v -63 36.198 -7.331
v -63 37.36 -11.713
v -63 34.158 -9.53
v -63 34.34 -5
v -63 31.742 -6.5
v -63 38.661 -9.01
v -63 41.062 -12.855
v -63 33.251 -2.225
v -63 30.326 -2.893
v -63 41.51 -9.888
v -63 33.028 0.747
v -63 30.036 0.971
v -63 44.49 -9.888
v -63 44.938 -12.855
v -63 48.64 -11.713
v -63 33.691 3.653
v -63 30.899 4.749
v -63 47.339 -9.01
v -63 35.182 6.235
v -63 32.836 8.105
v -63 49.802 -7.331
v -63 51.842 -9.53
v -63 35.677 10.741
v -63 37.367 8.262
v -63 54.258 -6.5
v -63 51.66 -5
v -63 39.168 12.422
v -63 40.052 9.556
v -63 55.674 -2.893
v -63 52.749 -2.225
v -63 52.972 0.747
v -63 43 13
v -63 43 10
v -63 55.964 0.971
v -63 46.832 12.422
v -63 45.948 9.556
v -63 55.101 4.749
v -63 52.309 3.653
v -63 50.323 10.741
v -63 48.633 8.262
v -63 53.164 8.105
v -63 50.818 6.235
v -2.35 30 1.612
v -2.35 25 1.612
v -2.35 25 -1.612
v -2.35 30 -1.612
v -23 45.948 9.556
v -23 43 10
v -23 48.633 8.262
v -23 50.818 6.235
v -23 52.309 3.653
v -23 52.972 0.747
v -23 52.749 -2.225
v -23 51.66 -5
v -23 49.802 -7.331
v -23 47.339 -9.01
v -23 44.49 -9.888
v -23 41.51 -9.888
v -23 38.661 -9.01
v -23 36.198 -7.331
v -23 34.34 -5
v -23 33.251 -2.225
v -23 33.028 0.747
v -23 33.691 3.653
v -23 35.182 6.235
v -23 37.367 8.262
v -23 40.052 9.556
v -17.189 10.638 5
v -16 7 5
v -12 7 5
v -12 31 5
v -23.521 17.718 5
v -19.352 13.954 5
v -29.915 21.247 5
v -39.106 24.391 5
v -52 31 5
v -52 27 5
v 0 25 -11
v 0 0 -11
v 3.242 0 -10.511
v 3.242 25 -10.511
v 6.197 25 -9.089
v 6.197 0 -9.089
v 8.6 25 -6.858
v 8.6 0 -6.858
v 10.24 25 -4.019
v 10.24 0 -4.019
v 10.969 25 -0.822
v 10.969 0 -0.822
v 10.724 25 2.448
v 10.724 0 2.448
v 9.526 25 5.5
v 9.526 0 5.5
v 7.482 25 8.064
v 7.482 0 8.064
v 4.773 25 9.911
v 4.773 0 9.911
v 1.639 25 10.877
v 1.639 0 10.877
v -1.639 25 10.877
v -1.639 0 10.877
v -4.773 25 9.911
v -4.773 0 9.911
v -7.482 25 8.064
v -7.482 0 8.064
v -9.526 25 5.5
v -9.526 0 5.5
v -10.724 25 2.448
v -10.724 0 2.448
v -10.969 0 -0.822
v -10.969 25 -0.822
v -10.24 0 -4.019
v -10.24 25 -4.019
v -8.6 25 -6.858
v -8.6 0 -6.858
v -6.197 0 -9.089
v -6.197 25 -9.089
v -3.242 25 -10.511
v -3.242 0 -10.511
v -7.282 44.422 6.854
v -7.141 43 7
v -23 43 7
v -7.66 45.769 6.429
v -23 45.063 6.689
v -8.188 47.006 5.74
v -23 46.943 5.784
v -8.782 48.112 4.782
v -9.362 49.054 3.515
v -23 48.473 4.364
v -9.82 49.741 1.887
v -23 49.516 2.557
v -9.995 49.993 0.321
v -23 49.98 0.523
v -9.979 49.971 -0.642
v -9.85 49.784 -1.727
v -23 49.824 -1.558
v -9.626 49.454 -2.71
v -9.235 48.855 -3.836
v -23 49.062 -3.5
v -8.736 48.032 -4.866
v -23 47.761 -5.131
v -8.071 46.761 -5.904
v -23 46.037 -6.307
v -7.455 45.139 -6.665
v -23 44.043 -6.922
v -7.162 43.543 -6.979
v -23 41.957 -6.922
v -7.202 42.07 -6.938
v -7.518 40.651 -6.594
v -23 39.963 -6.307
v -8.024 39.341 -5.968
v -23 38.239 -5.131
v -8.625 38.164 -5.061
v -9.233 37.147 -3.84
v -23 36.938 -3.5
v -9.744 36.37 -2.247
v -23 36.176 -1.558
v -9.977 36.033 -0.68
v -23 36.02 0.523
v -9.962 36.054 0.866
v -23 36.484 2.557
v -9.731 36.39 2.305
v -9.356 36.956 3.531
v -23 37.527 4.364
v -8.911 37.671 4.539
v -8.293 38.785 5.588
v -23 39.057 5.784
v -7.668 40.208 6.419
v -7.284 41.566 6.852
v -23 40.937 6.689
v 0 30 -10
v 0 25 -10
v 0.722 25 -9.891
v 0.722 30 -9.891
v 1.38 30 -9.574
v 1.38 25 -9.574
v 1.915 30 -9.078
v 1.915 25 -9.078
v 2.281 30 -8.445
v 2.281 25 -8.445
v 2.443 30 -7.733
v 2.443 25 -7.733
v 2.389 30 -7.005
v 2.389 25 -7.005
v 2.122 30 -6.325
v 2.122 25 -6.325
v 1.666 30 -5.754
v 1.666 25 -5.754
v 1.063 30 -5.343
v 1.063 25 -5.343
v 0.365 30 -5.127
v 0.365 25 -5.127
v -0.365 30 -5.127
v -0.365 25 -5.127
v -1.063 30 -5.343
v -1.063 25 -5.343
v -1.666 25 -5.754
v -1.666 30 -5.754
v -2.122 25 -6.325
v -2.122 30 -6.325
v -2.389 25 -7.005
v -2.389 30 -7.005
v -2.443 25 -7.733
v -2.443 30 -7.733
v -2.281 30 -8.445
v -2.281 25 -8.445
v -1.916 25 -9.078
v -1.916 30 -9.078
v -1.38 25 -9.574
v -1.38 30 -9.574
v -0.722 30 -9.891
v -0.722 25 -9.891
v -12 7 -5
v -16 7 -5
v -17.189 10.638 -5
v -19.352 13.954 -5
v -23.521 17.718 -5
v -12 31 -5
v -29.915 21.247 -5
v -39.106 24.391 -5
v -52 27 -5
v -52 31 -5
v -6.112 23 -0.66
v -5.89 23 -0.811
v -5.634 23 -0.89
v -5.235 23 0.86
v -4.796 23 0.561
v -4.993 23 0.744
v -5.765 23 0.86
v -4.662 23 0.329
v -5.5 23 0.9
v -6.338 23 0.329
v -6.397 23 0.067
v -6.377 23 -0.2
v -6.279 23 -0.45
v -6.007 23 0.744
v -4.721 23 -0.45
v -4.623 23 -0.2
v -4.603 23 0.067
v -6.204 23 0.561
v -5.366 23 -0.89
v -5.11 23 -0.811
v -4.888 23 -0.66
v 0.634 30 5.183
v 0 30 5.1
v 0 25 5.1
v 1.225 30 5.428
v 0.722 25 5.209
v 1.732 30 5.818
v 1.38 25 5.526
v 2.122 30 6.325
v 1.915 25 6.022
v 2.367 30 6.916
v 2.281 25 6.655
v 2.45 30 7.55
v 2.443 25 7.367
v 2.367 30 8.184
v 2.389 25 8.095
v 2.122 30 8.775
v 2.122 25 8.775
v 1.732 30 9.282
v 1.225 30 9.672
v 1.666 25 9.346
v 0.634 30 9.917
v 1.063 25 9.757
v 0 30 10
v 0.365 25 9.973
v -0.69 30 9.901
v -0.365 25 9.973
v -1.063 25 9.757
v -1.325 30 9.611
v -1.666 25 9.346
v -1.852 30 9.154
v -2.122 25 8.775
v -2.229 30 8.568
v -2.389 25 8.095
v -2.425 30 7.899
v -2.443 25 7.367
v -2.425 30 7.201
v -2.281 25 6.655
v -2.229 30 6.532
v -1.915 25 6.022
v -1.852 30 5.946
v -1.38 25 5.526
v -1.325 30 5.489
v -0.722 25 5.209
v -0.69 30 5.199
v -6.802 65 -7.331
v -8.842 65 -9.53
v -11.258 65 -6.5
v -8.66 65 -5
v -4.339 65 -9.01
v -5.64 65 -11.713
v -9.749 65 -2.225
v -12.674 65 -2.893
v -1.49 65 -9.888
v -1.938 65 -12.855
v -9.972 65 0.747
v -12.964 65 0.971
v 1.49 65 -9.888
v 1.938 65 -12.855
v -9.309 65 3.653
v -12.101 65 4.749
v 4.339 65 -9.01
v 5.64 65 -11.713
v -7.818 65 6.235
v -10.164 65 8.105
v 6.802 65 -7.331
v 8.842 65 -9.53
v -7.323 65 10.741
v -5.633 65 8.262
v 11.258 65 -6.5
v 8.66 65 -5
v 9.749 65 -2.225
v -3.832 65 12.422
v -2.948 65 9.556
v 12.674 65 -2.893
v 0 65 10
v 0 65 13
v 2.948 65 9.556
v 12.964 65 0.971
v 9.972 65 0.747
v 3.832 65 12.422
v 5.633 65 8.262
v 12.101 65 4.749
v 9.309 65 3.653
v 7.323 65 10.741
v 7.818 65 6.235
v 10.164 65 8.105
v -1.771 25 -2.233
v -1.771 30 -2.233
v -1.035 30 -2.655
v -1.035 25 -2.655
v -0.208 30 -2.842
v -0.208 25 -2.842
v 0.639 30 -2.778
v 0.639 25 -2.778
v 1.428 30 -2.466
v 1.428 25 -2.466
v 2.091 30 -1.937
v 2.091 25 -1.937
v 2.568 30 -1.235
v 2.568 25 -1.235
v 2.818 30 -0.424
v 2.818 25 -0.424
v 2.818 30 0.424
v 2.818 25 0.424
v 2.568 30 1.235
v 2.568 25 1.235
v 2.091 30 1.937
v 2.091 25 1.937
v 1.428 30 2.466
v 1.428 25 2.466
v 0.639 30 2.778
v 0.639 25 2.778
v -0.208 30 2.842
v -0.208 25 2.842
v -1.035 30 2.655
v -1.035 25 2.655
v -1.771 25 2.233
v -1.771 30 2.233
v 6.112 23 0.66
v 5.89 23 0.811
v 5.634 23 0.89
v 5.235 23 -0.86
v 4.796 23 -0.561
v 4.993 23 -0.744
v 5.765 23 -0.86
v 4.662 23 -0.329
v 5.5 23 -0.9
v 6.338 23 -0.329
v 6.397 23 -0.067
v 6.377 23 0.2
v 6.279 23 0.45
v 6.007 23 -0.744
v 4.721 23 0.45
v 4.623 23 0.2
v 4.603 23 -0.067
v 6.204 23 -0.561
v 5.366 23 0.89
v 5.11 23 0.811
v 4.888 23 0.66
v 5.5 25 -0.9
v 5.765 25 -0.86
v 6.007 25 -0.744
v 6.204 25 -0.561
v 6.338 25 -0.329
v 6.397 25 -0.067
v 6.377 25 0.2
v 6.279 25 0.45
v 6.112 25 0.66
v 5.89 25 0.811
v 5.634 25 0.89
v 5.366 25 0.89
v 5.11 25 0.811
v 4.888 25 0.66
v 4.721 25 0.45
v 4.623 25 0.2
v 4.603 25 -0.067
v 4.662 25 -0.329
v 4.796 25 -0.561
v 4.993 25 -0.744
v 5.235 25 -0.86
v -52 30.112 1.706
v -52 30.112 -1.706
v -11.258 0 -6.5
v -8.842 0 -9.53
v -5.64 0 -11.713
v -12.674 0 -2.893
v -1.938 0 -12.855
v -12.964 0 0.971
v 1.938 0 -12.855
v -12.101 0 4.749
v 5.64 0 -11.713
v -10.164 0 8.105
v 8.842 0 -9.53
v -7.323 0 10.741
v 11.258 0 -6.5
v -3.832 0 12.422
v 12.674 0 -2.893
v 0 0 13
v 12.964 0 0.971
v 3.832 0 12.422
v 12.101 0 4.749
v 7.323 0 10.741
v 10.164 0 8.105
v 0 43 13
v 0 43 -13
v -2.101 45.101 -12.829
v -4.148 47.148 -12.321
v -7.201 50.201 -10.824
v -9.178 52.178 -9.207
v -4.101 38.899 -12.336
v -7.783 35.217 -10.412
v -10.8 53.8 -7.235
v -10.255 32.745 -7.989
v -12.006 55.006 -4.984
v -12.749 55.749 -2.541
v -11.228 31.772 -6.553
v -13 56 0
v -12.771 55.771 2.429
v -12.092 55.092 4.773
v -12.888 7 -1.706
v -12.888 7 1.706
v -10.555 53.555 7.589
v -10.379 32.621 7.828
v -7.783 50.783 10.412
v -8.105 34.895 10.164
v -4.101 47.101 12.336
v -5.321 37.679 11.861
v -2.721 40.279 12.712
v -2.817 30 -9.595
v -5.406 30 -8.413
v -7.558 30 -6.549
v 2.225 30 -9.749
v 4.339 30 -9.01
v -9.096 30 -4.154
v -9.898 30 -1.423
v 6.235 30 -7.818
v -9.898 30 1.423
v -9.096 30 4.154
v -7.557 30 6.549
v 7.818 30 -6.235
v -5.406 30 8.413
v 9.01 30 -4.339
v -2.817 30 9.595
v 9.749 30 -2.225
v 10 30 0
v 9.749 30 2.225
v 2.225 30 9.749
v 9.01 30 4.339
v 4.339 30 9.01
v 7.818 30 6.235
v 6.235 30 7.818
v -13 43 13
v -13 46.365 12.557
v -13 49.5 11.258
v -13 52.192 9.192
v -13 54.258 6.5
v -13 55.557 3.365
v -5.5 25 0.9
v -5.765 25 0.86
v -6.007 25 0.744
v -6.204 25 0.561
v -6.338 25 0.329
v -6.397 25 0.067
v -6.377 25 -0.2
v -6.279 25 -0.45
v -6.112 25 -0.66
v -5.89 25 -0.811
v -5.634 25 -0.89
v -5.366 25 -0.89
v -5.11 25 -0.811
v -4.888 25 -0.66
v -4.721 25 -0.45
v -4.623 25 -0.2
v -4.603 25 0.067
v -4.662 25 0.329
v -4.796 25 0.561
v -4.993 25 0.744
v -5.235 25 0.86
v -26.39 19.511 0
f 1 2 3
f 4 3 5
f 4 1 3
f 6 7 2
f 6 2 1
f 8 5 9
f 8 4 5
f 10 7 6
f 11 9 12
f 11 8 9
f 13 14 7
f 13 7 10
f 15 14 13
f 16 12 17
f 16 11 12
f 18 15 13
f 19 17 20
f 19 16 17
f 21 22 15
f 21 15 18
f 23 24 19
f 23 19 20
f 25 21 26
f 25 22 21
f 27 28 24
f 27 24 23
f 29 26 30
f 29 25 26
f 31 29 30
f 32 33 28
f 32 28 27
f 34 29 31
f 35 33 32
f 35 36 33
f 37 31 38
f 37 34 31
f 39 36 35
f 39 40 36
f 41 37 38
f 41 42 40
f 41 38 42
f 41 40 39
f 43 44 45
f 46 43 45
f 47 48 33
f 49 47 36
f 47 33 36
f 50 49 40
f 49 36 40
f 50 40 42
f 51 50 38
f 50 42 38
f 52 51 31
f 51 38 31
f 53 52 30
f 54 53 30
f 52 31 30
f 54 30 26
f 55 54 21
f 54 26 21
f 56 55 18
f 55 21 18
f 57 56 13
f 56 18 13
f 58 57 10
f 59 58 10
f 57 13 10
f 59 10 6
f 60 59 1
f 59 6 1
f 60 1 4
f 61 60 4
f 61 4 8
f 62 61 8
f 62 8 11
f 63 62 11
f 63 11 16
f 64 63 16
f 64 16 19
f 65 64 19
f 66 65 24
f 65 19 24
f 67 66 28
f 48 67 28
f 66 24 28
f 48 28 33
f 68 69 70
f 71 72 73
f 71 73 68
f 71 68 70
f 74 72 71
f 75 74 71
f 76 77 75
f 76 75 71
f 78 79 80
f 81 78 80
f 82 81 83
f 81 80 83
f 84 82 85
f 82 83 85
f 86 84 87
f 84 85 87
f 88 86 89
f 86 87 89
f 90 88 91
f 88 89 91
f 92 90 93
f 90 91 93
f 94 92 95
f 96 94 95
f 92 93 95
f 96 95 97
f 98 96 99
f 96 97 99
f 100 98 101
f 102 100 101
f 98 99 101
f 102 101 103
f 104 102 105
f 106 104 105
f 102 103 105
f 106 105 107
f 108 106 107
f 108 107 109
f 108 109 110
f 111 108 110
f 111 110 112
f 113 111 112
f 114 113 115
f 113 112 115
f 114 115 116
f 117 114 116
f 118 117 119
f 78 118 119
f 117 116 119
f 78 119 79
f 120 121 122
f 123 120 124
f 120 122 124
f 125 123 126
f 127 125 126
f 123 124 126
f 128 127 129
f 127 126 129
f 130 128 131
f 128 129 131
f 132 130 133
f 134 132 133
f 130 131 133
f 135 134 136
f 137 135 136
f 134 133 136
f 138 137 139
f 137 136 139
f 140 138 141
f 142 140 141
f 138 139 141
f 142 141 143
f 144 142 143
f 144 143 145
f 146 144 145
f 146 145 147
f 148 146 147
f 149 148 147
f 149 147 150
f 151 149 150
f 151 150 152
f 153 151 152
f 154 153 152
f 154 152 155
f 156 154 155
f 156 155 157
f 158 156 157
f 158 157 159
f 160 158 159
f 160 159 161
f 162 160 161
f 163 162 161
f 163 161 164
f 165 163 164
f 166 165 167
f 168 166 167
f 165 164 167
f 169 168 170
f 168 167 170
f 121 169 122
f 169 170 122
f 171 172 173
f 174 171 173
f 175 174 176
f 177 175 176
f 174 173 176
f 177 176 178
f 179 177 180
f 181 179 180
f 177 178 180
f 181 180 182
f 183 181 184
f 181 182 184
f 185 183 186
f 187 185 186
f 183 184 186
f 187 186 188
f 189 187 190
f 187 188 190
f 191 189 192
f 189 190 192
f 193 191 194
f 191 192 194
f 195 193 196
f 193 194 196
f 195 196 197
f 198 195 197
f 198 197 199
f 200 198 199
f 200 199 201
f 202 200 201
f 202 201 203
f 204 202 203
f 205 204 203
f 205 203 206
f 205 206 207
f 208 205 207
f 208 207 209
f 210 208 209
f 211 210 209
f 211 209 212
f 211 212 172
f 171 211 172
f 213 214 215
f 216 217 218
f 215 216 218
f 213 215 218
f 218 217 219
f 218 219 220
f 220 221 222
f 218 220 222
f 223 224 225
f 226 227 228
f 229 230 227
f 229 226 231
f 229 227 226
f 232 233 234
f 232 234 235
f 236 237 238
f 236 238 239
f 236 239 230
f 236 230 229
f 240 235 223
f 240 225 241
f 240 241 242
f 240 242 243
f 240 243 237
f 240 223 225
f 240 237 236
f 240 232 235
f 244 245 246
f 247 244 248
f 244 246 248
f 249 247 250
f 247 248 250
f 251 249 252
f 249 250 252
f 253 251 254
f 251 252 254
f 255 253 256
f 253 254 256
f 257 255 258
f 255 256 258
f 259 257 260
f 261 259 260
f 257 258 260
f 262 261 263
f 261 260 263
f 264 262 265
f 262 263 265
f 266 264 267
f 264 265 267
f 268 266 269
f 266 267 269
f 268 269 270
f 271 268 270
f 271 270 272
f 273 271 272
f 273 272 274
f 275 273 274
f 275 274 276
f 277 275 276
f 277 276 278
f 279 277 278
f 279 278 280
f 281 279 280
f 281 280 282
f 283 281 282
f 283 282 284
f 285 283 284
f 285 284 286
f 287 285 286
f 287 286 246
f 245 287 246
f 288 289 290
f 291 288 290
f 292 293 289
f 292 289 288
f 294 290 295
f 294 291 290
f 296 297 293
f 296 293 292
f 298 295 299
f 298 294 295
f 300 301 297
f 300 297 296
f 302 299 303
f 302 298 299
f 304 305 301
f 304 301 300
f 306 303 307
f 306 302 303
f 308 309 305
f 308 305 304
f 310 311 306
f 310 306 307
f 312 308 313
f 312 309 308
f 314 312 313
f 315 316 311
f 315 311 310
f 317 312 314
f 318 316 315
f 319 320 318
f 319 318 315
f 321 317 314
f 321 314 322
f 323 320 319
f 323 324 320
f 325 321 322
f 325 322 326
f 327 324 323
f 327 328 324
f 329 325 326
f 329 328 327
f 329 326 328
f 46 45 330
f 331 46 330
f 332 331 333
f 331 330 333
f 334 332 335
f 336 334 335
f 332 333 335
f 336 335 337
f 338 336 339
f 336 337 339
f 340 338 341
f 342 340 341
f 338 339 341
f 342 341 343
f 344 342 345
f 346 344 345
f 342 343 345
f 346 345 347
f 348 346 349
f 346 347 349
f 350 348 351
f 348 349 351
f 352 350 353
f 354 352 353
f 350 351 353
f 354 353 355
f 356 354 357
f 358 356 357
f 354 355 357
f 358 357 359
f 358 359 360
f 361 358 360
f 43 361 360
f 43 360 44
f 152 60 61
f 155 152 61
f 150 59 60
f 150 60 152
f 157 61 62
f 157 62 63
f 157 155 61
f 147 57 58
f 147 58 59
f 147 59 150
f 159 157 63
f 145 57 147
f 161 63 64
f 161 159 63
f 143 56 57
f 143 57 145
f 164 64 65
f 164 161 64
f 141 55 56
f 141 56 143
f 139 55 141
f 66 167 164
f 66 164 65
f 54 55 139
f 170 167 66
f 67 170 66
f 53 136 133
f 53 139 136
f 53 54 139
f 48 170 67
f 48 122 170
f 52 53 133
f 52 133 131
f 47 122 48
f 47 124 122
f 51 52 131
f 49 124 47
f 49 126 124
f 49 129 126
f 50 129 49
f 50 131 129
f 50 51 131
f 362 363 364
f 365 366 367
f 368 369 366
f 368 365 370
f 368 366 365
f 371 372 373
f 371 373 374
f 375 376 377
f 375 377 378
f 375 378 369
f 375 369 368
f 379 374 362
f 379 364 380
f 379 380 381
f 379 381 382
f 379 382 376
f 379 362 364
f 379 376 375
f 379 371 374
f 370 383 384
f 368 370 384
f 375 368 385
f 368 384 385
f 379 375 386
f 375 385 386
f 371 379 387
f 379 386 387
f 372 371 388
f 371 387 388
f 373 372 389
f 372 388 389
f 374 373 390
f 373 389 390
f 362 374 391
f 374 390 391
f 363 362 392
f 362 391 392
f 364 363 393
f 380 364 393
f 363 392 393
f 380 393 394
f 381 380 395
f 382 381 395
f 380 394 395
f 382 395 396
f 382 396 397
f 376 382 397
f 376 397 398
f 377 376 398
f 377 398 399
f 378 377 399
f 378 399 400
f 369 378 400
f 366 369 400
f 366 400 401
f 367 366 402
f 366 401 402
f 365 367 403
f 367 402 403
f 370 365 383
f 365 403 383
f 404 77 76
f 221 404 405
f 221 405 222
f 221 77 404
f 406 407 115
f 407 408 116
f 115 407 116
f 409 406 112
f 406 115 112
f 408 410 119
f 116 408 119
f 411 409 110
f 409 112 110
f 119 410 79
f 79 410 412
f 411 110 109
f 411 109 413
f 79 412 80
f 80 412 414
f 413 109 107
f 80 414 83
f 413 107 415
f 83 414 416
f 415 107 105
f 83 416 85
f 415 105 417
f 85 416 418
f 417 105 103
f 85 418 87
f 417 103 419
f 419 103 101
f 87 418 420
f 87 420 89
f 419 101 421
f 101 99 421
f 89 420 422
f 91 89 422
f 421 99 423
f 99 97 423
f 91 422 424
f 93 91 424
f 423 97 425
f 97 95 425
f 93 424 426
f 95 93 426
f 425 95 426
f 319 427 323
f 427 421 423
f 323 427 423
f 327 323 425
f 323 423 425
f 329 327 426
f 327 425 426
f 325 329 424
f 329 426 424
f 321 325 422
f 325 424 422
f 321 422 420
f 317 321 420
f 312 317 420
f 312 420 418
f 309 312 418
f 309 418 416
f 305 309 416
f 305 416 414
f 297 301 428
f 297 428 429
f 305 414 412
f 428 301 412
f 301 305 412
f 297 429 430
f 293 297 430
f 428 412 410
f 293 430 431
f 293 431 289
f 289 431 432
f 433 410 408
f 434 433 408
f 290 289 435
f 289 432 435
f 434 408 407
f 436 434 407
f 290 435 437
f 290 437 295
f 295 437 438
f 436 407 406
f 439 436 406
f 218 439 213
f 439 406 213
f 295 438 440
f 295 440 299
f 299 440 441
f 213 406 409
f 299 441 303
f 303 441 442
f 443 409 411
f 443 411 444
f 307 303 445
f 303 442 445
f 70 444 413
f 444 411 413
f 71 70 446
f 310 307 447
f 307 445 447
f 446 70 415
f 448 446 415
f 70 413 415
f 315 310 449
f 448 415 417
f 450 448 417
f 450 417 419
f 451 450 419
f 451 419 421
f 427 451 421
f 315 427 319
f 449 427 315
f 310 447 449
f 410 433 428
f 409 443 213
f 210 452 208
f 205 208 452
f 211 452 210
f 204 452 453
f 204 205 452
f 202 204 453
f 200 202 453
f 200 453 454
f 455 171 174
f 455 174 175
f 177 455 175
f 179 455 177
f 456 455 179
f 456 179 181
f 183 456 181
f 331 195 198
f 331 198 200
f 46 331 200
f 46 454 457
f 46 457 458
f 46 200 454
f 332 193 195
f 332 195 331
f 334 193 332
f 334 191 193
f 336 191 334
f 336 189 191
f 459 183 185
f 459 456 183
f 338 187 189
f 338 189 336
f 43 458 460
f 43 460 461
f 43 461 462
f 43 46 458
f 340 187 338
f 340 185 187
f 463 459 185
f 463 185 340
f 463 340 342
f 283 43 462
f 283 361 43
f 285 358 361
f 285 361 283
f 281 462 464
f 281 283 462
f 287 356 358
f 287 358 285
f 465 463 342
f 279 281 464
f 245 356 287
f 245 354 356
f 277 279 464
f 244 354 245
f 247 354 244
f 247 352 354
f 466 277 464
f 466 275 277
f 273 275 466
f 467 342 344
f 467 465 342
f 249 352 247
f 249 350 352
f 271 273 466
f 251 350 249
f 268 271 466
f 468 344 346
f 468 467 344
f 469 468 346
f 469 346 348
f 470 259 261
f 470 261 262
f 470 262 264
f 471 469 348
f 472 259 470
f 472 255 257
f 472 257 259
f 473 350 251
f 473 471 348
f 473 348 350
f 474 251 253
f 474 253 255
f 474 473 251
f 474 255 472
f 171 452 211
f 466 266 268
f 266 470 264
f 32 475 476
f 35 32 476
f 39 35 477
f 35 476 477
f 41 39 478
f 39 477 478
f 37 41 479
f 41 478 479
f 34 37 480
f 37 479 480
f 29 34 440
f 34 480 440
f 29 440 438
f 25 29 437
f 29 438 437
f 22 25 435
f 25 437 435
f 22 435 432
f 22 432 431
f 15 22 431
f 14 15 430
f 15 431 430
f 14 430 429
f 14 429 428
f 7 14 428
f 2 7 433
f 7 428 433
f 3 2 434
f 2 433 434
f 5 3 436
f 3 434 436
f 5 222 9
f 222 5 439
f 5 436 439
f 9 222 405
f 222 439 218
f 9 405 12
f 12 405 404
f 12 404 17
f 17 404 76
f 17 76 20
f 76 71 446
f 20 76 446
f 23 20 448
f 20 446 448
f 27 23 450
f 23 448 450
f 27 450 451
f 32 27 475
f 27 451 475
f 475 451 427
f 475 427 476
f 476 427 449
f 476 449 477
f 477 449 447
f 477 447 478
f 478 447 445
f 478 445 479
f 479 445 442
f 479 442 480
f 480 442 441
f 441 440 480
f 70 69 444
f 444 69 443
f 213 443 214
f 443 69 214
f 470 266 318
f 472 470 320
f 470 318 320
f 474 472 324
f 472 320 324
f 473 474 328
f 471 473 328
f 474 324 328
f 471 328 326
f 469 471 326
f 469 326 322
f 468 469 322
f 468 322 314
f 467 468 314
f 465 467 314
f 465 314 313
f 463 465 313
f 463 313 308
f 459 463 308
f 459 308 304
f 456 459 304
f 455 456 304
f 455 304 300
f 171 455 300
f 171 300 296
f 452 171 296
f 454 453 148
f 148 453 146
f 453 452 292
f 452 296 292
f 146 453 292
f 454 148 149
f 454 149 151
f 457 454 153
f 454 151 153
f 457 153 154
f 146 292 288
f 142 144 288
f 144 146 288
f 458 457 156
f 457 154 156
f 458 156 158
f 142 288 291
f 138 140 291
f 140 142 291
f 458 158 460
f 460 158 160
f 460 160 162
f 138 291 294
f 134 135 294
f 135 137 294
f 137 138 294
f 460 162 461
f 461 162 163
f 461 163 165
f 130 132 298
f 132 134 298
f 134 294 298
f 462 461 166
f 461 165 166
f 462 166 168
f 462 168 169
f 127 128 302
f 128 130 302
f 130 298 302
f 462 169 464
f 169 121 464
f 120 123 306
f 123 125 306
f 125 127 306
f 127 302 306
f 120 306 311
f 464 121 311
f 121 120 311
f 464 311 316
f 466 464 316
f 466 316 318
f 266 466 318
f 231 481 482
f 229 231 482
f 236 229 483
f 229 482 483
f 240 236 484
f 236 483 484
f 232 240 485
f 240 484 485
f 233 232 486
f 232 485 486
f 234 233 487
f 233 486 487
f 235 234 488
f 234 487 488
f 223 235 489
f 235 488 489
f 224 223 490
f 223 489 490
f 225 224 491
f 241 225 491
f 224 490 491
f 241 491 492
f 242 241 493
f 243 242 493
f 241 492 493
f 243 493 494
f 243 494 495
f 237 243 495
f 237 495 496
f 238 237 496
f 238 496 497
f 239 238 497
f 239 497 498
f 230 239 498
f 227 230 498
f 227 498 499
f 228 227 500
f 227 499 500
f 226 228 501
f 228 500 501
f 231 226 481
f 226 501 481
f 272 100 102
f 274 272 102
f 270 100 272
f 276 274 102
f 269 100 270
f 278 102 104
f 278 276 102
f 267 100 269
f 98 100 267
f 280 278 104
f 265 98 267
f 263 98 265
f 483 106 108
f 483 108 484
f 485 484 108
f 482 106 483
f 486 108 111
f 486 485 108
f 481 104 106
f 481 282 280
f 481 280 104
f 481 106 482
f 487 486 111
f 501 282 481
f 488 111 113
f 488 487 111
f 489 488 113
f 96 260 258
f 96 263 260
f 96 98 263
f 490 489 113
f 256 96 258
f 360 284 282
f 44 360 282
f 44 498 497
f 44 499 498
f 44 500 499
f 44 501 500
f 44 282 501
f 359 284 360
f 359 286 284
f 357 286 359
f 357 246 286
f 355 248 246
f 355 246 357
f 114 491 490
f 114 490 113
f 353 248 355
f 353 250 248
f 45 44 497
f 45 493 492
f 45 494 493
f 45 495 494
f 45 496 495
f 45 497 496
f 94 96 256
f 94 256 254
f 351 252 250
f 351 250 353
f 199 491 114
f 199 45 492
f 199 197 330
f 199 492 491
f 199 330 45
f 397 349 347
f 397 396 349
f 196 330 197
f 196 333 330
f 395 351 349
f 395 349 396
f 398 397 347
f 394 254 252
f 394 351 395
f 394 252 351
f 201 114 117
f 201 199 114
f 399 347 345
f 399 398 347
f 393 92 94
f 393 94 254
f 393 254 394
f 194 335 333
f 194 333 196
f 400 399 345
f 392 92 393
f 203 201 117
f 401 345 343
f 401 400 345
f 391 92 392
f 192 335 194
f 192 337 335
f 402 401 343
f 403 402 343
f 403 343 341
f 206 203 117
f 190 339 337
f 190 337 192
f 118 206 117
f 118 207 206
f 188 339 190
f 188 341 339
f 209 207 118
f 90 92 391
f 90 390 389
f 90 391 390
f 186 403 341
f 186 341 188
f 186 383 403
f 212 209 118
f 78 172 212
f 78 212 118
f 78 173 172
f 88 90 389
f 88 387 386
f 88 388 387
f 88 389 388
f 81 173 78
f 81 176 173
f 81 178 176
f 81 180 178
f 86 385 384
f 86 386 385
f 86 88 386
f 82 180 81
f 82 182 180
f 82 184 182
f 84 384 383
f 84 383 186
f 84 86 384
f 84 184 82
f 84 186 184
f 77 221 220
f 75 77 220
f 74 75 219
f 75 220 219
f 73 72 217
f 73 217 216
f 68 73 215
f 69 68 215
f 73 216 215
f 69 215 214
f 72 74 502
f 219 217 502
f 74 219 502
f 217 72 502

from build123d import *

# Parameters (mm, degrees)
BUITENCIRKEL_R                    = 13
CILINDER_BASIS_DEPTH              = 65
BINNENCIRKEL_MOTOR_R              = 11
HOLTE_MOTOR_DEPTH                 = 25
BINNENCIRKEL_BUIS_R               = 10
HOLTE_BUIS_DEPTH                  = 35
UITSPARING_MOTORAS_DEPTH          = 45.02272140611028
CIRKEL_MOTORPINNETJES_R           = 0.8999999999999995
UITSPARINGEN_MOTORPINNETJES_DEPTH = 2
CIRKEL_POLEN_R                    = 2.450000000000002
UITSPARINGEN_MOTORPOLEN_DEPTH     = 45.02272140611028
SKETCH2_R                         = 13.000000000000007
BOSS_EXTRUDE1_DEPTH               = 50
BOSS_EXTRUDE1_DIRECTION_2_REACH   = 73.204
SKETCH3_R                         = 10.000000000000005
CUT_EXTRUDE1_DEPTH                = 40
CUT_EXTRUDE2_REACH                = 79.421
CUT_EXTRUDE2_END_RADIUS           = 10
SKETCH4_R                         = 6.999999999999997
BOSS_EXTRUDE2_DEPTH               = 5
BOSS_EXTRUDE2_DEPTH_BACK          = 5
BOSS_EXTRUDE6_REACH               = 76.713
BOSS_EXTRUDE6_END_RADIUS          = 13.000000000000007
SKETCH11_W                        = 36.000000000000014
SKETCH11_H                        = 10
BOSS_EXTRUDE7_REACH               = 83.259
BOSS_EXTRUDE7_END_RADIUS          = 13.000000000000002
SKETCH12_W                        = 10
SKETCH12_H                        = 24.000000000000004


with BuildPart() as part:
    # Buitencirkel → Cilinder basis (new body)
    with BuildSketch(Plane(origin=(0, 0, 0), x_dir=(1, 0, 0), z_dir=(0, 1, 0))):
        Circle(BUITENCIRKEL_R)
    extrude(amount=CILINDER_BASIS_DEPTH)

    # Binnencirkel motor → Holte motor (cut)
    with BuildSketch(Plane(origin=(0, 0, 0), x_dir=(-1, 0, 0), z_dir=(0, -1, 0))):
        Circle(BINNENCIRKEL_MOTOR_R)
    extrude(amount=-HOLTE_MOTOR_DEPTH, mode=Mode.SUBTRACT)

    # Binnencirkel buis → Holte buis (cut)
    with BuildSketch(Plane(origin=(0, 65, 0), x_dir=(1, 0, 0), z_dir=(0, 1, 0))):
        Circle(BINNENCIRKEL_BUIS_R)
    extrude(amount=-HOLTE_BUIS_DEPTH, mode=Mode.SUBTRACT)

    # Cirkel motoras → Uitsparing motoras (cut, through all)
    with BuildSketch(Plane(origin=(0, 24.999999999999996, 0), x_dir=(-1, 0, 0), z_dir=(0, -1, 0))):
        with BuildLine():
            Line((2.3500000000000005, -1.6124515496597092), (2.3500000000000005, 1.6124515496597092))
            ThreePointArc((2.3500000000000005, 1.6124515496597092), (-2.85, 3.5e-16), (2.3500000000000005, -1.6124515496597092))
        make_face()
    extrude(amount=-UITSPARING_MOTORAS_DEPTH, mode=Mode.SUBTRACT)

    # Cirkel motorpinnetjes → Uitsparingen motorpinnetjes (add)
    with BuildSketch(Plane(origin=(0, 24.999999999999996, 0), x_dir=(-1, 0, 0), z_dir=(0, -1, 0))):
        with Locations((-5.5, 0)):
            Circle(CIRKEL_MOTORPINNETJES_R)
        with Locations((5.5, 0)):
            Circle(CIRKEL_MOTORPINNETJES_R)
    extrude(amount=UITSPARINGEN_MOTORPINNETJES_DEPTH)

    # Cirkel polen → Uitsparingen motorpolen (cut, through all)
    with BuildSketch(Plane(origin=(0, 24.999999999999996, 0), x_dir=(-1, 0, 0), z_dir=(0, -1, 0))):
        with Locations((9.2e-16, -7.55)):
            Circle(CIRKEL_POLEN_R)
        with Locations((9.2e-16, 7.55)):
            Circle(CIRKEL_POLEN_R)
    extrude(amount=-UITSPARINGEN_MOTORPOLEN_DEPTH, mode=Mode.SUBTRACT)

    # Sketch2 → Boss-Extrude1 (add)
    with BuildSketch(Plane.ZY.offset(13.000000000000002)):
        with Locations((0, 43)):
            Circle(SKETCH2_R)
    extrude(amount=BOSS_EXTRUDE1_DEPTH)

    # Boss-Extrude1 direction 2: up to this face of the body
    boss_extrude1_direction_2_end = part.part.faces().sort_by_distance((-13, 32.5, 0))[0]
    # Sketch2 → Boss-Extrude1 direction 2 (add, up to the picked face)
    with BuildSketch(Plane.ZY.offset(13.000000000000002), mode=Mode.PRIVATE) as boss_extrude1_direction_2_sk1:
        with Locations((0, 43)):
            Circle(SKETCH2_R)
    boss_extrude1_direction_2_tool1 = split(extrude(boss_extrude1_direction_2_sk1.sketch, amount=-BOSS_EXTRUDE1_DIRECTION_2_REACH, mode=Mode.PRIVATE), bisect_by=boss_extrude1_direction_2_end, keep=Keep.BOTH, mode=Mode.PRIVATE)
    add(boss_extrude1_direction_2_tool1.solids().sort_by(Axis((-13, 43, 0), (1, 0, 0)))[0])
    add(boss_extrude1_direction_2_tool1.solids().sort_by(Axis((-13, 43, 0), (1, 0, 0)))[1])

    # Sketch3 → Cut-Extrude1 (cut)
    with BuildSketch(Plane.ZY.offset(63)):
        with Locations((0, 43)):
            Circle(SKETCH3_R)
    extrude(amount=-CUT_EXTRUDE1_DEPTH, mode=Mode.SUBTRACT)

    # Cut-Extrude2: up to this cylinder (the profile starts outside it)
    cut_extrude2_end = Plane(origin=(0, 43, 0), z_dir=(0, 1, 0)) * Cylinder(CUT_EXTRUDE2_END_RADIUS, 179.842, mode=Mode.PRIVATE)
    # Sketch4 → Cut-Extrude2 (cut, up to the surface)
    with BuildSketch(Plane.ZY.offset(23), mode=Mode.PRIVATE) as cut_extrude2_sk1:
        with Locations((0, 43)):
            Circle(SKETCH4_R)
    cut_extrude2_tool1 = extrude(cut_extrude2_sk1.sketch, amount=-CUT_EXTRUDE2_REACH, mode=Mode.PRIVATE) - cut_extrude2_end
    add(cut_extrude2_tool1.solids().sort_by_distance((-23, 43, 0))[0], mode=Mode.SUBTRACT)



with BuildPart() as body_2:
    # Sketch5 → Boss-Extrude2 (new, two sides: drawn at the far end of the back side and taken through both)
    with BuildSketch(Plane.XY.offset(-BOSS_EXTRUDE2_DEPTH_BACK)):
        with BuildLine():
            Line((-52, 26.999999999999996), (-16, 27))
            Line((-16, 27), (-16, 6.999999999999999))
            add(Edge.make_bspline(
                [(-52, 26.999999999999996), (-18.780366723420578, 22.02228525010515), (-16, 6.999999999999999)],
                knots=[0, 0, 0, 1, 1, 1], degree=2))
        make_face()
    extrude(amount=BOSS_EXTRUDE2_DEPTH + BOSS_EXTRUDE2_DEPTH_BACK)


with BuildPart() as part_1:
    add(part.part)

    add(body_2.part)  # Boss-Extrude6 merges body 2
    # Boss-Extrude6: up to this cylinder (the profile starts outside it)
    boss_extrude6_end = Plane(origin=(-34, 43, 0), z_dir=(1, 0, 0)) * Cylinder(BOSS_EXTRUDE6_END_RADIUS, 180.426, mode=Mode.PRIVATE)
    # Sketch11 → Boss-Extrude6 (add, up to the surface)
    with BuildSketch(Plane(origin=(-2.6e-15, 27, 0), x_dir=(1, 1e-16, 0), z_dir=(-1e-16, 1, 0)), mode=Mode.PRIVATE) as boss_extrude6_sk1:
        with Locations((-34, 0)):
            Rectangle(SKETCH11_W, SKETCH11_H)
    boss_extrude6_tool1 = extrude(boss_extrude6_sk1.sketch, amount=BOSS_EXTRUDE6_REACH, mode=Mode.PRIVATE) - boss_extrude6_end
    add(boss_extrude6_tool1.solids().sort_by_distance((-34, 27, 0))[0])

    # Boss-Extrude7: up to this cylinder (the profile starts outside it)
    boss_extrude7_end = Plane(origin=(0, 19, 0), z_dir=(0, -1, 0)) * Cylinder(BOSS_EXTRUDE7_END_RADIUS, 193.518, mode=Mode.PRIVATE)
    # Sketch12 → Boss-Extrude7 (add, up to the surface)
    with BuildSketch(Plane(origin=(-15.999999999999996, -1.54e-15, 0), x_dir=(0, 0, -1), z_dir=(1, 1e-16, 0)), mode=Mode.PRIVATE) as boss_extrude7_sk1:
        with Locations((0, 19.000000000000004)):
            Rectangle(SKETCH12_W, SKETCH12_H)
    boss_extrude7_tool1 = extrude(boss_extrude7_sk1.sketch, amount=BOSS_EXTRUDE7_REACH, mode=Mode.PRIVATE) - boss_extrude7_end
    add(boss_extrude7_tool1.solids().sort_by_distance((-16, 19, 0))[0])


solid = part_1.part
